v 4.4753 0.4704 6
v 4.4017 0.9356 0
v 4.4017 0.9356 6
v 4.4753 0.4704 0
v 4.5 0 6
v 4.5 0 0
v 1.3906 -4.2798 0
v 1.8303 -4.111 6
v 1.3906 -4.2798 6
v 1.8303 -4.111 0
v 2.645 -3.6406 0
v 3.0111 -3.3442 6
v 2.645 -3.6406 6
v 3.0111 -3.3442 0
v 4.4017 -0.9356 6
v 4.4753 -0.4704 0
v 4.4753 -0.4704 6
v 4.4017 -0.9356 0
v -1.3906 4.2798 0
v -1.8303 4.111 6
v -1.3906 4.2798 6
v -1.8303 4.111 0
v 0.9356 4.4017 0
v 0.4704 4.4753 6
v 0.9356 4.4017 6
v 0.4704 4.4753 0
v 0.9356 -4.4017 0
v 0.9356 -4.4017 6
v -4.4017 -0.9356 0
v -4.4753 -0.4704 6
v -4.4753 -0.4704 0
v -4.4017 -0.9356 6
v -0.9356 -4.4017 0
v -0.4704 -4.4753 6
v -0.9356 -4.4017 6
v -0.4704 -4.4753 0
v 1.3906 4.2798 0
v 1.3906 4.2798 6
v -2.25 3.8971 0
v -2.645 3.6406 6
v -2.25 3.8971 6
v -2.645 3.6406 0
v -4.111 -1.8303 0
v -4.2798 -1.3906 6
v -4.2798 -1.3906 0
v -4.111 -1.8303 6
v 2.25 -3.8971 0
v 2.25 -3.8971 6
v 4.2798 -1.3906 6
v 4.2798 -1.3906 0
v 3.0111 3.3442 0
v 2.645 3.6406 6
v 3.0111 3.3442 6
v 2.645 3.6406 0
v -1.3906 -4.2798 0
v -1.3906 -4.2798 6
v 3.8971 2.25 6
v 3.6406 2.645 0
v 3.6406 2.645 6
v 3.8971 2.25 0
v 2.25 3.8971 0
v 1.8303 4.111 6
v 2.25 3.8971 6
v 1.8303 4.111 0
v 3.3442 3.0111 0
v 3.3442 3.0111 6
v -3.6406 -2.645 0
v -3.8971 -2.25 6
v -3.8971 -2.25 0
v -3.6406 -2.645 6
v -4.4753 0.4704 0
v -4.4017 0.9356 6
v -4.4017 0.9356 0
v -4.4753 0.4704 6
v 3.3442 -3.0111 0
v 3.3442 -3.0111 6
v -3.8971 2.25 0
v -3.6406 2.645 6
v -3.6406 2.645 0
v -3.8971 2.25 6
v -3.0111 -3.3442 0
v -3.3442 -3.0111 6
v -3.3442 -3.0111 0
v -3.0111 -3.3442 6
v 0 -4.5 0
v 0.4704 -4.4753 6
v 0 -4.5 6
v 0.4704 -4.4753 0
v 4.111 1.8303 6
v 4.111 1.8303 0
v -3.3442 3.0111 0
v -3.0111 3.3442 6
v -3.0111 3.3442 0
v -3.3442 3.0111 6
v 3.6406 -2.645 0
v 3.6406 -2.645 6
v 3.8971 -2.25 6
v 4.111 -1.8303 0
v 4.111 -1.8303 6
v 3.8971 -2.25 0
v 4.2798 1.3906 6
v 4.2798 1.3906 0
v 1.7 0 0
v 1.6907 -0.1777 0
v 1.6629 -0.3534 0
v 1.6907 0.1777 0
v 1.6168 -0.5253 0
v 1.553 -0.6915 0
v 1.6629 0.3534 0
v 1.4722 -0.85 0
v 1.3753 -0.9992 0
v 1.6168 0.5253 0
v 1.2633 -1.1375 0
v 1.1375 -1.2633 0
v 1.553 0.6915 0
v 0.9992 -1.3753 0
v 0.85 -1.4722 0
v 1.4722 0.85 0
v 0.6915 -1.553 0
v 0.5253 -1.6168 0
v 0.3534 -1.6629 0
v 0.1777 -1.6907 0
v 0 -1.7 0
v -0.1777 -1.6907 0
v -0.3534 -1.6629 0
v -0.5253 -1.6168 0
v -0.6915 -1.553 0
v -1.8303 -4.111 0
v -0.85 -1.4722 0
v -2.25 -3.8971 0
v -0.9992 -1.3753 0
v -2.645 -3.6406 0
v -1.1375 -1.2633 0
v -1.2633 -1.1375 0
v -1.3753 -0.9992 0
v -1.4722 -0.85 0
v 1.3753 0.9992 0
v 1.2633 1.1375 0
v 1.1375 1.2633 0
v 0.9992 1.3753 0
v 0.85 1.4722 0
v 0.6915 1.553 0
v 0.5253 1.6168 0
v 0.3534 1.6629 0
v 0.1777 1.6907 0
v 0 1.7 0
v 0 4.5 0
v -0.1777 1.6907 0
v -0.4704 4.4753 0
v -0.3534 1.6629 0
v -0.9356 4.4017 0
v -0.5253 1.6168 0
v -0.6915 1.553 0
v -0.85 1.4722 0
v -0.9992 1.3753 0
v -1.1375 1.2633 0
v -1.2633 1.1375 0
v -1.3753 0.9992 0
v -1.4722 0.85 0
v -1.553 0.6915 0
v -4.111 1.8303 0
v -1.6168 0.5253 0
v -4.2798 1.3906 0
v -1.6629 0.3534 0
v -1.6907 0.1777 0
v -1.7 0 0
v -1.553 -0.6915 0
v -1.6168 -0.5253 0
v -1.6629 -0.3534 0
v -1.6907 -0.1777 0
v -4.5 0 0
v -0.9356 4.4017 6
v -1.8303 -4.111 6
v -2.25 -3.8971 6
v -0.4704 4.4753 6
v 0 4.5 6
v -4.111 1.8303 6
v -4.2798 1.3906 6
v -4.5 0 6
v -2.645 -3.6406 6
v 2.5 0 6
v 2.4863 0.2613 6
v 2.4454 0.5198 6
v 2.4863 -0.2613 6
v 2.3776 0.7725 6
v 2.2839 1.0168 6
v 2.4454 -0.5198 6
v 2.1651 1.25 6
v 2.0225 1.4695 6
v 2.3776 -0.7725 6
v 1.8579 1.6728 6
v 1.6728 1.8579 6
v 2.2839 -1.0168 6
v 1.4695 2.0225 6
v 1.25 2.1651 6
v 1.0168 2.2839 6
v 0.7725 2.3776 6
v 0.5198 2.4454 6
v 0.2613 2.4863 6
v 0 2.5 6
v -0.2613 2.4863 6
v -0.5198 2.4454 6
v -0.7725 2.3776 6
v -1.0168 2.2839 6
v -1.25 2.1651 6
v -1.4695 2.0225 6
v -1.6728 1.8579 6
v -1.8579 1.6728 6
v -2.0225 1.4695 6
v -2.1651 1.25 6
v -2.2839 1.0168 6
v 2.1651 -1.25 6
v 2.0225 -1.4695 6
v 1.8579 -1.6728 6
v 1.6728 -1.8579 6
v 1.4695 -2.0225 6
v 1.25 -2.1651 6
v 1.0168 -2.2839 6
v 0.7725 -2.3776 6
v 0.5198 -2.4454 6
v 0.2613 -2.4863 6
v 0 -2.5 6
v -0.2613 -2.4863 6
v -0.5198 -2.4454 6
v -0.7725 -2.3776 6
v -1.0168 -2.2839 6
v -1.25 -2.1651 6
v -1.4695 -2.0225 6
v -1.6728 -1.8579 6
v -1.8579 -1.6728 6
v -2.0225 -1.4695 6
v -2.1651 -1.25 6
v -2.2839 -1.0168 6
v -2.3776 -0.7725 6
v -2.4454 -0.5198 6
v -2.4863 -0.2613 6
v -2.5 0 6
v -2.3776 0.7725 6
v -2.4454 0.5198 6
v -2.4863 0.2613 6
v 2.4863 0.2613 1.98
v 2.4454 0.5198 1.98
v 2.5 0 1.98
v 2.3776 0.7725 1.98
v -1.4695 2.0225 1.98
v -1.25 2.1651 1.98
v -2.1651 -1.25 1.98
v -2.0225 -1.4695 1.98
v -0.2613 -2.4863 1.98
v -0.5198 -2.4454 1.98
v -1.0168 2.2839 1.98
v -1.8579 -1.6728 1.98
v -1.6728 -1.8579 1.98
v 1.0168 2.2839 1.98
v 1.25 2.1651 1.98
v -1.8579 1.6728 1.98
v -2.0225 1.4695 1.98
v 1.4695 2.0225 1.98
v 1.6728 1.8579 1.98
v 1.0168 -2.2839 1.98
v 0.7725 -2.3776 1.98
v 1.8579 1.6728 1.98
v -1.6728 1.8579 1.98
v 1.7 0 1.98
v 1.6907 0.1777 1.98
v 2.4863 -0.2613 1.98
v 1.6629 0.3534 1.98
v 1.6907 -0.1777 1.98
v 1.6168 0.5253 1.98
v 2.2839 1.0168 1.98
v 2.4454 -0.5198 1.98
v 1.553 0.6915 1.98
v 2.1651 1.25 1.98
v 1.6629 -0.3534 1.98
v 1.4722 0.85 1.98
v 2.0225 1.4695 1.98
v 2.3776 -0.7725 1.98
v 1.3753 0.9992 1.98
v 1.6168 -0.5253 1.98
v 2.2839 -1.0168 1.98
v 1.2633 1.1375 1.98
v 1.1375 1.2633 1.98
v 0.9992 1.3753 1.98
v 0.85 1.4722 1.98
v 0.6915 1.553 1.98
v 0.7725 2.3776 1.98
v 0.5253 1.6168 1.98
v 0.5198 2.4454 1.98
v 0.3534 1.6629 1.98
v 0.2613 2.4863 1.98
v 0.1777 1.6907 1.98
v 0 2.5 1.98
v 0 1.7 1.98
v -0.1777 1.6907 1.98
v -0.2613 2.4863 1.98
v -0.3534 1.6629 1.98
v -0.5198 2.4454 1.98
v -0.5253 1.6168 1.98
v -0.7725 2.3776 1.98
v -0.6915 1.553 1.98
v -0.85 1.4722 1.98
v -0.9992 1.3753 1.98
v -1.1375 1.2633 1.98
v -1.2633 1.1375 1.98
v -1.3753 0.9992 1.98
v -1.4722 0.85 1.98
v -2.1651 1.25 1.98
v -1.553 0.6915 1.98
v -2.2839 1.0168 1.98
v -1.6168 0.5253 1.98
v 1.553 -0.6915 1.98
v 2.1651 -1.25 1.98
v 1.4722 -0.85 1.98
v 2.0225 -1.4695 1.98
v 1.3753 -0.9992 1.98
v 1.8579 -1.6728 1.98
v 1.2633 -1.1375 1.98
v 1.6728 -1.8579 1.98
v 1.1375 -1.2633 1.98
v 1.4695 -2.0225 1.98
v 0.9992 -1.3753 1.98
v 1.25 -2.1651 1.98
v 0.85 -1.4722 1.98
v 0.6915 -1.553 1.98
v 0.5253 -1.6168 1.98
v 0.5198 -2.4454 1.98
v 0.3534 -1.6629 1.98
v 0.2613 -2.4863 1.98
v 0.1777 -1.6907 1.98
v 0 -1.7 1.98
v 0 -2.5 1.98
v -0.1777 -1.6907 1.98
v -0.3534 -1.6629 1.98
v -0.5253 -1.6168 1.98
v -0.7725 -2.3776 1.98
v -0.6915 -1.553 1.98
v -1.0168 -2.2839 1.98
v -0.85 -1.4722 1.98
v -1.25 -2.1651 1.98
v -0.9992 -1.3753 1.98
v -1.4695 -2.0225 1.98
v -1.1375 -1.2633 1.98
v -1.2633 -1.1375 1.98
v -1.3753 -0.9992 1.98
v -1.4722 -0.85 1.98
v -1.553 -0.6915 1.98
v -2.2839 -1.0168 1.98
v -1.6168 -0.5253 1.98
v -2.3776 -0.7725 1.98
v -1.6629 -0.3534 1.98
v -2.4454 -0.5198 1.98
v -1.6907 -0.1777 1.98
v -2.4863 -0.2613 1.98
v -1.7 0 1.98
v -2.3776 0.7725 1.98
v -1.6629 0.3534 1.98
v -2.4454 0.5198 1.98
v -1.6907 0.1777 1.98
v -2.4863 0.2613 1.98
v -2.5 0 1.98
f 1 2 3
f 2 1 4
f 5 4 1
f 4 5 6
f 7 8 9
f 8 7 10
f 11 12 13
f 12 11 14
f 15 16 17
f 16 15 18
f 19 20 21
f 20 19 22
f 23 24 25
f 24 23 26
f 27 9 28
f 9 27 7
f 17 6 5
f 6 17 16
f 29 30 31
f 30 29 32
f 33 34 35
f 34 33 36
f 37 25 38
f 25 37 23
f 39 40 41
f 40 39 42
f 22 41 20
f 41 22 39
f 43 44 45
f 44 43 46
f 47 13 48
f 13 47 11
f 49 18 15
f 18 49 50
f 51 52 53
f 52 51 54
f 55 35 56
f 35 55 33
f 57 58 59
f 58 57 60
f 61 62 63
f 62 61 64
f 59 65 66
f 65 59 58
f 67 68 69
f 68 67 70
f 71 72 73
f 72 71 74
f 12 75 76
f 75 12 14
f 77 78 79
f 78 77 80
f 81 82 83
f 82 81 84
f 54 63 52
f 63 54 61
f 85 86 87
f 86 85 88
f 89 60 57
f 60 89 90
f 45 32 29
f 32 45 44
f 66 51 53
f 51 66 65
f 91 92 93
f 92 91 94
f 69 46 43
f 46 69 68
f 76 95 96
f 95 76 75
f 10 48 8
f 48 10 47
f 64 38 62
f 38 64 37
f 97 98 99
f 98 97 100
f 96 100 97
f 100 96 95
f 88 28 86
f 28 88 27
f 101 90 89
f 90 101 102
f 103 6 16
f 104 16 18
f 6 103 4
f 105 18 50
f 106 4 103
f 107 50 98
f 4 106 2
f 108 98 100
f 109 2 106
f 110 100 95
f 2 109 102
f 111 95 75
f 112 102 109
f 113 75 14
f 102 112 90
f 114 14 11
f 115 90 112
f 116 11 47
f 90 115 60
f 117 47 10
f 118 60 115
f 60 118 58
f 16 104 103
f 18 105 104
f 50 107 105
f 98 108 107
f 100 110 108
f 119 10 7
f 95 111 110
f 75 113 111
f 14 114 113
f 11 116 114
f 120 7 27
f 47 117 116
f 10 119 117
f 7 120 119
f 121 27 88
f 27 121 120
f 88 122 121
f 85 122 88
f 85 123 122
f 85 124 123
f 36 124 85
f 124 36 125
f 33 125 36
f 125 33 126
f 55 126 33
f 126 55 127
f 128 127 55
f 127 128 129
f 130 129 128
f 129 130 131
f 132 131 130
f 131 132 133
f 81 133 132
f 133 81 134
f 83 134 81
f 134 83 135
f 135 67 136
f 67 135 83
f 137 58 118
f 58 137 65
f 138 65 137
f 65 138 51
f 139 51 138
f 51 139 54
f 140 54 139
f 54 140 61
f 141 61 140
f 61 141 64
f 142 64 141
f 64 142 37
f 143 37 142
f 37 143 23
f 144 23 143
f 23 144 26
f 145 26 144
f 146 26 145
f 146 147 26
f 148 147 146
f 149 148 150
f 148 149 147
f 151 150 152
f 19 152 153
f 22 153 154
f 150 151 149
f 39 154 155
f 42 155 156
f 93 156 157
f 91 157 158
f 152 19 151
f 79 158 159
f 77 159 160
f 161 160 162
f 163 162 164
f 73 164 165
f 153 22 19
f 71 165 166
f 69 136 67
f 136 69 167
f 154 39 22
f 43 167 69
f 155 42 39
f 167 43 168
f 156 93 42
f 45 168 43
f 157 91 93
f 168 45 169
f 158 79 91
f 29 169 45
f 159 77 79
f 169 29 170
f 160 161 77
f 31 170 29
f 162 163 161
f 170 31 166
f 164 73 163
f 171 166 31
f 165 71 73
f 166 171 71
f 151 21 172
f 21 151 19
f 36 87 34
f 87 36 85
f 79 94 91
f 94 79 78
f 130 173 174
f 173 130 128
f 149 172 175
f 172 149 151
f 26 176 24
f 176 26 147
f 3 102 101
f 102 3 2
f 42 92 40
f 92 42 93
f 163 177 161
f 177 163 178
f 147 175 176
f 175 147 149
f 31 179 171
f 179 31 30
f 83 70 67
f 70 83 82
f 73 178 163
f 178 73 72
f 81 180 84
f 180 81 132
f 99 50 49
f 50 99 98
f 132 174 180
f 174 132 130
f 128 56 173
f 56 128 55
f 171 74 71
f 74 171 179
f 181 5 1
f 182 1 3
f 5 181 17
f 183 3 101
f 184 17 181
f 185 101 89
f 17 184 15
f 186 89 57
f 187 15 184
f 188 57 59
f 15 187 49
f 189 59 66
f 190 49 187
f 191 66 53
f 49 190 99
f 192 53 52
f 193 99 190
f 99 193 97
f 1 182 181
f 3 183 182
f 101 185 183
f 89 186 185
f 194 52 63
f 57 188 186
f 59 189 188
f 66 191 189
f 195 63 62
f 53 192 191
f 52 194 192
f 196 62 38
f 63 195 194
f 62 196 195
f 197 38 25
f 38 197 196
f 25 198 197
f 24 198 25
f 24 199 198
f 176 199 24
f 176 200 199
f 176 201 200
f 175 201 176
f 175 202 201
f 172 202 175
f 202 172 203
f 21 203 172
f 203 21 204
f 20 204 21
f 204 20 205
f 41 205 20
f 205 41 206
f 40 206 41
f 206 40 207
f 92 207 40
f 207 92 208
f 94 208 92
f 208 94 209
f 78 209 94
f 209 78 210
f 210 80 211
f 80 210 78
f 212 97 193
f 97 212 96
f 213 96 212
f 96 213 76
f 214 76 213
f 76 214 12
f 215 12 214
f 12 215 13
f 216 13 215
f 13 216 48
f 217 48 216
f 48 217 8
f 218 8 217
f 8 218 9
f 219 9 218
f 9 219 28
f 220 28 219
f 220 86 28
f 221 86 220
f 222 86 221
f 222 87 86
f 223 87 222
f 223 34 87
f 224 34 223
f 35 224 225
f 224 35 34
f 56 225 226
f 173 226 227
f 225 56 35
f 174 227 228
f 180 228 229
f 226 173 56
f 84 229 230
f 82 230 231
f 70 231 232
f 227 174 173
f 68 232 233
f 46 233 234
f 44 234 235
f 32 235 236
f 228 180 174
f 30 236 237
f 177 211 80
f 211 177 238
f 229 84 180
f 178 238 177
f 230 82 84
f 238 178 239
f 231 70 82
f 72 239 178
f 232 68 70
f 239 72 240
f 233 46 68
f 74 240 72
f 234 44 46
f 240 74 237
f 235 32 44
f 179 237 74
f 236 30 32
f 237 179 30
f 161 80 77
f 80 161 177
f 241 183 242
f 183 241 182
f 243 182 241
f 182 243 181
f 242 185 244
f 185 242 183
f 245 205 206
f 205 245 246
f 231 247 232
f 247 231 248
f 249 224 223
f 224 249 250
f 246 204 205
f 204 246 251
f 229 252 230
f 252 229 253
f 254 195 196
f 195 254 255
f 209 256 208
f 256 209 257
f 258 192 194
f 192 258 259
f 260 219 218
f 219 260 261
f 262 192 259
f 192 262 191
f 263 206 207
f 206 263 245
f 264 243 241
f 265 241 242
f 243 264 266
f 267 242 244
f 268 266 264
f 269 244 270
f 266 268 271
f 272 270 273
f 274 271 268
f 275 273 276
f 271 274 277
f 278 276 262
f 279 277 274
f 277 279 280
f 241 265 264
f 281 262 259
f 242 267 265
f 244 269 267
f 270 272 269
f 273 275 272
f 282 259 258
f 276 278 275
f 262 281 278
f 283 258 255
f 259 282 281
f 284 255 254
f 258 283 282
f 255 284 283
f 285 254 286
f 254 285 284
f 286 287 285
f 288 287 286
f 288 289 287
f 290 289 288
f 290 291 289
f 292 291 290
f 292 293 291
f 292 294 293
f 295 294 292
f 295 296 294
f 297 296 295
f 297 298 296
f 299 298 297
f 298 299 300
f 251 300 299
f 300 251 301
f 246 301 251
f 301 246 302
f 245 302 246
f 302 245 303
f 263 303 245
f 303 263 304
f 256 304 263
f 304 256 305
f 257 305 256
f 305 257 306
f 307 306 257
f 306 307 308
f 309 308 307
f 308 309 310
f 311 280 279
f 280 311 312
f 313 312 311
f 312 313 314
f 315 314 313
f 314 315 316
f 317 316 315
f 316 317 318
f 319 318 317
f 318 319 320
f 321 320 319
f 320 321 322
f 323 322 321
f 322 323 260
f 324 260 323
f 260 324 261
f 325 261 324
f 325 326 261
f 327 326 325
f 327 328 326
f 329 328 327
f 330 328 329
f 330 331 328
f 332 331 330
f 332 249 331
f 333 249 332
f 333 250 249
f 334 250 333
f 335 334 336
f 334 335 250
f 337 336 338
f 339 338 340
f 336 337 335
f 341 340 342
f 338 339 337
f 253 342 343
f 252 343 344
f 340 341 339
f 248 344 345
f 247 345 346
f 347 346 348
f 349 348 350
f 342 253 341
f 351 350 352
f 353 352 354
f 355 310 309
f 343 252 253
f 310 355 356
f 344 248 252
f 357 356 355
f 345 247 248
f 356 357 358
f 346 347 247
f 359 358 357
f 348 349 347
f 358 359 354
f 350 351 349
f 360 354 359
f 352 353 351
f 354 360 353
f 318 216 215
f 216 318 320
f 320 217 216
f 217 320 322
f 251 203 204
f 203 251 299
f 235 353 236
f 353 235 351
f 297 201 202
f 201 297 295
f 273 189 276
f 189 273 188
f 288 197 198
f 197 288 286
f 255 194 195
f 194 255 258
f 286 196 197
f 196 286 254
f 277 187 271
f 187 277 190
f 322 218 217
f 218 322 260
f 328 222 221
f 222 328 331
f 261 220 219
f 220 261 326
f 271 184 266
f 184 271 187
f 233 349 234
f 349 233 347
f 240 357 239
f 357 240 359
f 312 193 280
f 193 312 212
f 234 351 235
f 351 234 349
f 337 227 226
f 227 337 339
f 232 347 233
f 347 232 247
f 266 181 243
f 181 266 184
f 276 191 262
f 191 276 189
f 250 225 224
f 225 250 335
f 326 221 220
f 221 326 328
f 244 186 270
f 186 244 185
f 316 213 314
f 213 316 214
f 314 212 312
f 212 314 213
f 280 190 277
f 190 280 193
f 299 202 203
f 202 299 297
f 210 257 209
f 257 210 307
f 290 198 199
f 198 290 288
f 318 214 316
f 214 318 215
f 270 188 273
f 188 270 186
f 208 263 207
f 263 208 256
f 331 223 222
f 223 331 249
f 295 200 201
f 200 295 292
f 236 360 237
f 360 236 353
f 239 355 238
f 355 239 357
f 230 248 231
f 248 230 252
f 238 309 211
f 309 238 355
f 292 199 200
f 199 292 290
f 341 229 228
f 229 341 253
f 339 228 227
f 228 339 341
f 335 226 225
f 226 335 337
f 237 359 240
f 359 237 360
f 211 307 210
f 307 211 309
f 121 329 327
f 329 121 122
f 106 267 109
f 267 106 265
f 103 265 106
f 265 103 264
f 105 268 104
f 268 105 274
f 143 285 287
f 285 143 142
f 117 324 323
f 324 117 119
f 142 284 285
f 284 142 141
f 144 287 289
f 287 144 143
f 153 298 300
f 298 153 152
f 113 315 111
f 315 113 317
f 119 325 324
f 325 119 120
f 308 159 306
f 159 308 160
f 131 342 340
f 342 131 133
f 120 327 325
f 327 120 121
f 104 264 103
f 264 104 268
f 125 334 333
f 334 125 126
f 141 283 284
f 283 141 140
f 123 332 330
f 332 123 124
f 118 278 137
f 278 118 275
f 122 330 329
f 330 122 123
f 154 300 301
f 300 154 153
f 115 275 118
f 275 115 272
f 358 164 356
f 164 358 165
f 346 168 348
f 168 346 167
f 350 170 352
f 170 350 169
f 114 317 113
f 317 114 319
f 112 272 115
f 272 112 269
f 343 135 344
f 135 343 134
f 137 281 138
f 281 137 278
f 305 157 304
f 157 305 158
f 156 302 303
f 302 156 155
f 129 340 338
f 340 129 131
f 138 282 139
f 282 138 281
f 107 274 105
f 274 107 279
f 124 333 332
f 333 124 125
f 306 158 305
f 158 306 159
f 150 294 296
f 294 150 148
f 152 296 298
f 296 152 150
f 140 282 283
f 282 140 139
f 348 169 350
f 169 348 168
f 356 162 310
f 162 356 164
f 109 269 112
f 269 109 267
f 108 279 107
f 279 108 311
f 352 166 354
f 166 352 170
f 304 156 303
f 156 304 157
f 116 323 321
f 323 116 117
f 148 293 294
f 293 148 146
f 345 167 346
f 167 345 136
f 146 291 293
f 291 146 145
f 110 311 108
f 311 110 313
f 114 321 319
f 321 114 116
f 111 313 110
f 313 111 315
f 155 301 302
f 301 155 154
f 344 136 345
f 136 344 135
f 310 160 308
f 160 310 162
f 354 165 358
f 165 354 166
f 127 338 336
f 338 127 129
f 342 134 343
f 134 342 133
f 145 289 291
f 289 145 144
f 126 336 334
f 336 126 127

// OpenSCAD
// Recessed magnet cup.
$fn = 60;
eps = 0.02;
magnet_d = 5;
wall = 2;
outer_d = magnet_d+2*wall;
height = wall+4;
difference() {
    cylinder(d=outer_d,h=height);
    translate([0,0,wall-eps]) cylinder(d=magnet_d,h=height-wall+2*eps);
    translate([0,0,-eps]) cylinder(d=3.4,h=wall+2*eps);
}
